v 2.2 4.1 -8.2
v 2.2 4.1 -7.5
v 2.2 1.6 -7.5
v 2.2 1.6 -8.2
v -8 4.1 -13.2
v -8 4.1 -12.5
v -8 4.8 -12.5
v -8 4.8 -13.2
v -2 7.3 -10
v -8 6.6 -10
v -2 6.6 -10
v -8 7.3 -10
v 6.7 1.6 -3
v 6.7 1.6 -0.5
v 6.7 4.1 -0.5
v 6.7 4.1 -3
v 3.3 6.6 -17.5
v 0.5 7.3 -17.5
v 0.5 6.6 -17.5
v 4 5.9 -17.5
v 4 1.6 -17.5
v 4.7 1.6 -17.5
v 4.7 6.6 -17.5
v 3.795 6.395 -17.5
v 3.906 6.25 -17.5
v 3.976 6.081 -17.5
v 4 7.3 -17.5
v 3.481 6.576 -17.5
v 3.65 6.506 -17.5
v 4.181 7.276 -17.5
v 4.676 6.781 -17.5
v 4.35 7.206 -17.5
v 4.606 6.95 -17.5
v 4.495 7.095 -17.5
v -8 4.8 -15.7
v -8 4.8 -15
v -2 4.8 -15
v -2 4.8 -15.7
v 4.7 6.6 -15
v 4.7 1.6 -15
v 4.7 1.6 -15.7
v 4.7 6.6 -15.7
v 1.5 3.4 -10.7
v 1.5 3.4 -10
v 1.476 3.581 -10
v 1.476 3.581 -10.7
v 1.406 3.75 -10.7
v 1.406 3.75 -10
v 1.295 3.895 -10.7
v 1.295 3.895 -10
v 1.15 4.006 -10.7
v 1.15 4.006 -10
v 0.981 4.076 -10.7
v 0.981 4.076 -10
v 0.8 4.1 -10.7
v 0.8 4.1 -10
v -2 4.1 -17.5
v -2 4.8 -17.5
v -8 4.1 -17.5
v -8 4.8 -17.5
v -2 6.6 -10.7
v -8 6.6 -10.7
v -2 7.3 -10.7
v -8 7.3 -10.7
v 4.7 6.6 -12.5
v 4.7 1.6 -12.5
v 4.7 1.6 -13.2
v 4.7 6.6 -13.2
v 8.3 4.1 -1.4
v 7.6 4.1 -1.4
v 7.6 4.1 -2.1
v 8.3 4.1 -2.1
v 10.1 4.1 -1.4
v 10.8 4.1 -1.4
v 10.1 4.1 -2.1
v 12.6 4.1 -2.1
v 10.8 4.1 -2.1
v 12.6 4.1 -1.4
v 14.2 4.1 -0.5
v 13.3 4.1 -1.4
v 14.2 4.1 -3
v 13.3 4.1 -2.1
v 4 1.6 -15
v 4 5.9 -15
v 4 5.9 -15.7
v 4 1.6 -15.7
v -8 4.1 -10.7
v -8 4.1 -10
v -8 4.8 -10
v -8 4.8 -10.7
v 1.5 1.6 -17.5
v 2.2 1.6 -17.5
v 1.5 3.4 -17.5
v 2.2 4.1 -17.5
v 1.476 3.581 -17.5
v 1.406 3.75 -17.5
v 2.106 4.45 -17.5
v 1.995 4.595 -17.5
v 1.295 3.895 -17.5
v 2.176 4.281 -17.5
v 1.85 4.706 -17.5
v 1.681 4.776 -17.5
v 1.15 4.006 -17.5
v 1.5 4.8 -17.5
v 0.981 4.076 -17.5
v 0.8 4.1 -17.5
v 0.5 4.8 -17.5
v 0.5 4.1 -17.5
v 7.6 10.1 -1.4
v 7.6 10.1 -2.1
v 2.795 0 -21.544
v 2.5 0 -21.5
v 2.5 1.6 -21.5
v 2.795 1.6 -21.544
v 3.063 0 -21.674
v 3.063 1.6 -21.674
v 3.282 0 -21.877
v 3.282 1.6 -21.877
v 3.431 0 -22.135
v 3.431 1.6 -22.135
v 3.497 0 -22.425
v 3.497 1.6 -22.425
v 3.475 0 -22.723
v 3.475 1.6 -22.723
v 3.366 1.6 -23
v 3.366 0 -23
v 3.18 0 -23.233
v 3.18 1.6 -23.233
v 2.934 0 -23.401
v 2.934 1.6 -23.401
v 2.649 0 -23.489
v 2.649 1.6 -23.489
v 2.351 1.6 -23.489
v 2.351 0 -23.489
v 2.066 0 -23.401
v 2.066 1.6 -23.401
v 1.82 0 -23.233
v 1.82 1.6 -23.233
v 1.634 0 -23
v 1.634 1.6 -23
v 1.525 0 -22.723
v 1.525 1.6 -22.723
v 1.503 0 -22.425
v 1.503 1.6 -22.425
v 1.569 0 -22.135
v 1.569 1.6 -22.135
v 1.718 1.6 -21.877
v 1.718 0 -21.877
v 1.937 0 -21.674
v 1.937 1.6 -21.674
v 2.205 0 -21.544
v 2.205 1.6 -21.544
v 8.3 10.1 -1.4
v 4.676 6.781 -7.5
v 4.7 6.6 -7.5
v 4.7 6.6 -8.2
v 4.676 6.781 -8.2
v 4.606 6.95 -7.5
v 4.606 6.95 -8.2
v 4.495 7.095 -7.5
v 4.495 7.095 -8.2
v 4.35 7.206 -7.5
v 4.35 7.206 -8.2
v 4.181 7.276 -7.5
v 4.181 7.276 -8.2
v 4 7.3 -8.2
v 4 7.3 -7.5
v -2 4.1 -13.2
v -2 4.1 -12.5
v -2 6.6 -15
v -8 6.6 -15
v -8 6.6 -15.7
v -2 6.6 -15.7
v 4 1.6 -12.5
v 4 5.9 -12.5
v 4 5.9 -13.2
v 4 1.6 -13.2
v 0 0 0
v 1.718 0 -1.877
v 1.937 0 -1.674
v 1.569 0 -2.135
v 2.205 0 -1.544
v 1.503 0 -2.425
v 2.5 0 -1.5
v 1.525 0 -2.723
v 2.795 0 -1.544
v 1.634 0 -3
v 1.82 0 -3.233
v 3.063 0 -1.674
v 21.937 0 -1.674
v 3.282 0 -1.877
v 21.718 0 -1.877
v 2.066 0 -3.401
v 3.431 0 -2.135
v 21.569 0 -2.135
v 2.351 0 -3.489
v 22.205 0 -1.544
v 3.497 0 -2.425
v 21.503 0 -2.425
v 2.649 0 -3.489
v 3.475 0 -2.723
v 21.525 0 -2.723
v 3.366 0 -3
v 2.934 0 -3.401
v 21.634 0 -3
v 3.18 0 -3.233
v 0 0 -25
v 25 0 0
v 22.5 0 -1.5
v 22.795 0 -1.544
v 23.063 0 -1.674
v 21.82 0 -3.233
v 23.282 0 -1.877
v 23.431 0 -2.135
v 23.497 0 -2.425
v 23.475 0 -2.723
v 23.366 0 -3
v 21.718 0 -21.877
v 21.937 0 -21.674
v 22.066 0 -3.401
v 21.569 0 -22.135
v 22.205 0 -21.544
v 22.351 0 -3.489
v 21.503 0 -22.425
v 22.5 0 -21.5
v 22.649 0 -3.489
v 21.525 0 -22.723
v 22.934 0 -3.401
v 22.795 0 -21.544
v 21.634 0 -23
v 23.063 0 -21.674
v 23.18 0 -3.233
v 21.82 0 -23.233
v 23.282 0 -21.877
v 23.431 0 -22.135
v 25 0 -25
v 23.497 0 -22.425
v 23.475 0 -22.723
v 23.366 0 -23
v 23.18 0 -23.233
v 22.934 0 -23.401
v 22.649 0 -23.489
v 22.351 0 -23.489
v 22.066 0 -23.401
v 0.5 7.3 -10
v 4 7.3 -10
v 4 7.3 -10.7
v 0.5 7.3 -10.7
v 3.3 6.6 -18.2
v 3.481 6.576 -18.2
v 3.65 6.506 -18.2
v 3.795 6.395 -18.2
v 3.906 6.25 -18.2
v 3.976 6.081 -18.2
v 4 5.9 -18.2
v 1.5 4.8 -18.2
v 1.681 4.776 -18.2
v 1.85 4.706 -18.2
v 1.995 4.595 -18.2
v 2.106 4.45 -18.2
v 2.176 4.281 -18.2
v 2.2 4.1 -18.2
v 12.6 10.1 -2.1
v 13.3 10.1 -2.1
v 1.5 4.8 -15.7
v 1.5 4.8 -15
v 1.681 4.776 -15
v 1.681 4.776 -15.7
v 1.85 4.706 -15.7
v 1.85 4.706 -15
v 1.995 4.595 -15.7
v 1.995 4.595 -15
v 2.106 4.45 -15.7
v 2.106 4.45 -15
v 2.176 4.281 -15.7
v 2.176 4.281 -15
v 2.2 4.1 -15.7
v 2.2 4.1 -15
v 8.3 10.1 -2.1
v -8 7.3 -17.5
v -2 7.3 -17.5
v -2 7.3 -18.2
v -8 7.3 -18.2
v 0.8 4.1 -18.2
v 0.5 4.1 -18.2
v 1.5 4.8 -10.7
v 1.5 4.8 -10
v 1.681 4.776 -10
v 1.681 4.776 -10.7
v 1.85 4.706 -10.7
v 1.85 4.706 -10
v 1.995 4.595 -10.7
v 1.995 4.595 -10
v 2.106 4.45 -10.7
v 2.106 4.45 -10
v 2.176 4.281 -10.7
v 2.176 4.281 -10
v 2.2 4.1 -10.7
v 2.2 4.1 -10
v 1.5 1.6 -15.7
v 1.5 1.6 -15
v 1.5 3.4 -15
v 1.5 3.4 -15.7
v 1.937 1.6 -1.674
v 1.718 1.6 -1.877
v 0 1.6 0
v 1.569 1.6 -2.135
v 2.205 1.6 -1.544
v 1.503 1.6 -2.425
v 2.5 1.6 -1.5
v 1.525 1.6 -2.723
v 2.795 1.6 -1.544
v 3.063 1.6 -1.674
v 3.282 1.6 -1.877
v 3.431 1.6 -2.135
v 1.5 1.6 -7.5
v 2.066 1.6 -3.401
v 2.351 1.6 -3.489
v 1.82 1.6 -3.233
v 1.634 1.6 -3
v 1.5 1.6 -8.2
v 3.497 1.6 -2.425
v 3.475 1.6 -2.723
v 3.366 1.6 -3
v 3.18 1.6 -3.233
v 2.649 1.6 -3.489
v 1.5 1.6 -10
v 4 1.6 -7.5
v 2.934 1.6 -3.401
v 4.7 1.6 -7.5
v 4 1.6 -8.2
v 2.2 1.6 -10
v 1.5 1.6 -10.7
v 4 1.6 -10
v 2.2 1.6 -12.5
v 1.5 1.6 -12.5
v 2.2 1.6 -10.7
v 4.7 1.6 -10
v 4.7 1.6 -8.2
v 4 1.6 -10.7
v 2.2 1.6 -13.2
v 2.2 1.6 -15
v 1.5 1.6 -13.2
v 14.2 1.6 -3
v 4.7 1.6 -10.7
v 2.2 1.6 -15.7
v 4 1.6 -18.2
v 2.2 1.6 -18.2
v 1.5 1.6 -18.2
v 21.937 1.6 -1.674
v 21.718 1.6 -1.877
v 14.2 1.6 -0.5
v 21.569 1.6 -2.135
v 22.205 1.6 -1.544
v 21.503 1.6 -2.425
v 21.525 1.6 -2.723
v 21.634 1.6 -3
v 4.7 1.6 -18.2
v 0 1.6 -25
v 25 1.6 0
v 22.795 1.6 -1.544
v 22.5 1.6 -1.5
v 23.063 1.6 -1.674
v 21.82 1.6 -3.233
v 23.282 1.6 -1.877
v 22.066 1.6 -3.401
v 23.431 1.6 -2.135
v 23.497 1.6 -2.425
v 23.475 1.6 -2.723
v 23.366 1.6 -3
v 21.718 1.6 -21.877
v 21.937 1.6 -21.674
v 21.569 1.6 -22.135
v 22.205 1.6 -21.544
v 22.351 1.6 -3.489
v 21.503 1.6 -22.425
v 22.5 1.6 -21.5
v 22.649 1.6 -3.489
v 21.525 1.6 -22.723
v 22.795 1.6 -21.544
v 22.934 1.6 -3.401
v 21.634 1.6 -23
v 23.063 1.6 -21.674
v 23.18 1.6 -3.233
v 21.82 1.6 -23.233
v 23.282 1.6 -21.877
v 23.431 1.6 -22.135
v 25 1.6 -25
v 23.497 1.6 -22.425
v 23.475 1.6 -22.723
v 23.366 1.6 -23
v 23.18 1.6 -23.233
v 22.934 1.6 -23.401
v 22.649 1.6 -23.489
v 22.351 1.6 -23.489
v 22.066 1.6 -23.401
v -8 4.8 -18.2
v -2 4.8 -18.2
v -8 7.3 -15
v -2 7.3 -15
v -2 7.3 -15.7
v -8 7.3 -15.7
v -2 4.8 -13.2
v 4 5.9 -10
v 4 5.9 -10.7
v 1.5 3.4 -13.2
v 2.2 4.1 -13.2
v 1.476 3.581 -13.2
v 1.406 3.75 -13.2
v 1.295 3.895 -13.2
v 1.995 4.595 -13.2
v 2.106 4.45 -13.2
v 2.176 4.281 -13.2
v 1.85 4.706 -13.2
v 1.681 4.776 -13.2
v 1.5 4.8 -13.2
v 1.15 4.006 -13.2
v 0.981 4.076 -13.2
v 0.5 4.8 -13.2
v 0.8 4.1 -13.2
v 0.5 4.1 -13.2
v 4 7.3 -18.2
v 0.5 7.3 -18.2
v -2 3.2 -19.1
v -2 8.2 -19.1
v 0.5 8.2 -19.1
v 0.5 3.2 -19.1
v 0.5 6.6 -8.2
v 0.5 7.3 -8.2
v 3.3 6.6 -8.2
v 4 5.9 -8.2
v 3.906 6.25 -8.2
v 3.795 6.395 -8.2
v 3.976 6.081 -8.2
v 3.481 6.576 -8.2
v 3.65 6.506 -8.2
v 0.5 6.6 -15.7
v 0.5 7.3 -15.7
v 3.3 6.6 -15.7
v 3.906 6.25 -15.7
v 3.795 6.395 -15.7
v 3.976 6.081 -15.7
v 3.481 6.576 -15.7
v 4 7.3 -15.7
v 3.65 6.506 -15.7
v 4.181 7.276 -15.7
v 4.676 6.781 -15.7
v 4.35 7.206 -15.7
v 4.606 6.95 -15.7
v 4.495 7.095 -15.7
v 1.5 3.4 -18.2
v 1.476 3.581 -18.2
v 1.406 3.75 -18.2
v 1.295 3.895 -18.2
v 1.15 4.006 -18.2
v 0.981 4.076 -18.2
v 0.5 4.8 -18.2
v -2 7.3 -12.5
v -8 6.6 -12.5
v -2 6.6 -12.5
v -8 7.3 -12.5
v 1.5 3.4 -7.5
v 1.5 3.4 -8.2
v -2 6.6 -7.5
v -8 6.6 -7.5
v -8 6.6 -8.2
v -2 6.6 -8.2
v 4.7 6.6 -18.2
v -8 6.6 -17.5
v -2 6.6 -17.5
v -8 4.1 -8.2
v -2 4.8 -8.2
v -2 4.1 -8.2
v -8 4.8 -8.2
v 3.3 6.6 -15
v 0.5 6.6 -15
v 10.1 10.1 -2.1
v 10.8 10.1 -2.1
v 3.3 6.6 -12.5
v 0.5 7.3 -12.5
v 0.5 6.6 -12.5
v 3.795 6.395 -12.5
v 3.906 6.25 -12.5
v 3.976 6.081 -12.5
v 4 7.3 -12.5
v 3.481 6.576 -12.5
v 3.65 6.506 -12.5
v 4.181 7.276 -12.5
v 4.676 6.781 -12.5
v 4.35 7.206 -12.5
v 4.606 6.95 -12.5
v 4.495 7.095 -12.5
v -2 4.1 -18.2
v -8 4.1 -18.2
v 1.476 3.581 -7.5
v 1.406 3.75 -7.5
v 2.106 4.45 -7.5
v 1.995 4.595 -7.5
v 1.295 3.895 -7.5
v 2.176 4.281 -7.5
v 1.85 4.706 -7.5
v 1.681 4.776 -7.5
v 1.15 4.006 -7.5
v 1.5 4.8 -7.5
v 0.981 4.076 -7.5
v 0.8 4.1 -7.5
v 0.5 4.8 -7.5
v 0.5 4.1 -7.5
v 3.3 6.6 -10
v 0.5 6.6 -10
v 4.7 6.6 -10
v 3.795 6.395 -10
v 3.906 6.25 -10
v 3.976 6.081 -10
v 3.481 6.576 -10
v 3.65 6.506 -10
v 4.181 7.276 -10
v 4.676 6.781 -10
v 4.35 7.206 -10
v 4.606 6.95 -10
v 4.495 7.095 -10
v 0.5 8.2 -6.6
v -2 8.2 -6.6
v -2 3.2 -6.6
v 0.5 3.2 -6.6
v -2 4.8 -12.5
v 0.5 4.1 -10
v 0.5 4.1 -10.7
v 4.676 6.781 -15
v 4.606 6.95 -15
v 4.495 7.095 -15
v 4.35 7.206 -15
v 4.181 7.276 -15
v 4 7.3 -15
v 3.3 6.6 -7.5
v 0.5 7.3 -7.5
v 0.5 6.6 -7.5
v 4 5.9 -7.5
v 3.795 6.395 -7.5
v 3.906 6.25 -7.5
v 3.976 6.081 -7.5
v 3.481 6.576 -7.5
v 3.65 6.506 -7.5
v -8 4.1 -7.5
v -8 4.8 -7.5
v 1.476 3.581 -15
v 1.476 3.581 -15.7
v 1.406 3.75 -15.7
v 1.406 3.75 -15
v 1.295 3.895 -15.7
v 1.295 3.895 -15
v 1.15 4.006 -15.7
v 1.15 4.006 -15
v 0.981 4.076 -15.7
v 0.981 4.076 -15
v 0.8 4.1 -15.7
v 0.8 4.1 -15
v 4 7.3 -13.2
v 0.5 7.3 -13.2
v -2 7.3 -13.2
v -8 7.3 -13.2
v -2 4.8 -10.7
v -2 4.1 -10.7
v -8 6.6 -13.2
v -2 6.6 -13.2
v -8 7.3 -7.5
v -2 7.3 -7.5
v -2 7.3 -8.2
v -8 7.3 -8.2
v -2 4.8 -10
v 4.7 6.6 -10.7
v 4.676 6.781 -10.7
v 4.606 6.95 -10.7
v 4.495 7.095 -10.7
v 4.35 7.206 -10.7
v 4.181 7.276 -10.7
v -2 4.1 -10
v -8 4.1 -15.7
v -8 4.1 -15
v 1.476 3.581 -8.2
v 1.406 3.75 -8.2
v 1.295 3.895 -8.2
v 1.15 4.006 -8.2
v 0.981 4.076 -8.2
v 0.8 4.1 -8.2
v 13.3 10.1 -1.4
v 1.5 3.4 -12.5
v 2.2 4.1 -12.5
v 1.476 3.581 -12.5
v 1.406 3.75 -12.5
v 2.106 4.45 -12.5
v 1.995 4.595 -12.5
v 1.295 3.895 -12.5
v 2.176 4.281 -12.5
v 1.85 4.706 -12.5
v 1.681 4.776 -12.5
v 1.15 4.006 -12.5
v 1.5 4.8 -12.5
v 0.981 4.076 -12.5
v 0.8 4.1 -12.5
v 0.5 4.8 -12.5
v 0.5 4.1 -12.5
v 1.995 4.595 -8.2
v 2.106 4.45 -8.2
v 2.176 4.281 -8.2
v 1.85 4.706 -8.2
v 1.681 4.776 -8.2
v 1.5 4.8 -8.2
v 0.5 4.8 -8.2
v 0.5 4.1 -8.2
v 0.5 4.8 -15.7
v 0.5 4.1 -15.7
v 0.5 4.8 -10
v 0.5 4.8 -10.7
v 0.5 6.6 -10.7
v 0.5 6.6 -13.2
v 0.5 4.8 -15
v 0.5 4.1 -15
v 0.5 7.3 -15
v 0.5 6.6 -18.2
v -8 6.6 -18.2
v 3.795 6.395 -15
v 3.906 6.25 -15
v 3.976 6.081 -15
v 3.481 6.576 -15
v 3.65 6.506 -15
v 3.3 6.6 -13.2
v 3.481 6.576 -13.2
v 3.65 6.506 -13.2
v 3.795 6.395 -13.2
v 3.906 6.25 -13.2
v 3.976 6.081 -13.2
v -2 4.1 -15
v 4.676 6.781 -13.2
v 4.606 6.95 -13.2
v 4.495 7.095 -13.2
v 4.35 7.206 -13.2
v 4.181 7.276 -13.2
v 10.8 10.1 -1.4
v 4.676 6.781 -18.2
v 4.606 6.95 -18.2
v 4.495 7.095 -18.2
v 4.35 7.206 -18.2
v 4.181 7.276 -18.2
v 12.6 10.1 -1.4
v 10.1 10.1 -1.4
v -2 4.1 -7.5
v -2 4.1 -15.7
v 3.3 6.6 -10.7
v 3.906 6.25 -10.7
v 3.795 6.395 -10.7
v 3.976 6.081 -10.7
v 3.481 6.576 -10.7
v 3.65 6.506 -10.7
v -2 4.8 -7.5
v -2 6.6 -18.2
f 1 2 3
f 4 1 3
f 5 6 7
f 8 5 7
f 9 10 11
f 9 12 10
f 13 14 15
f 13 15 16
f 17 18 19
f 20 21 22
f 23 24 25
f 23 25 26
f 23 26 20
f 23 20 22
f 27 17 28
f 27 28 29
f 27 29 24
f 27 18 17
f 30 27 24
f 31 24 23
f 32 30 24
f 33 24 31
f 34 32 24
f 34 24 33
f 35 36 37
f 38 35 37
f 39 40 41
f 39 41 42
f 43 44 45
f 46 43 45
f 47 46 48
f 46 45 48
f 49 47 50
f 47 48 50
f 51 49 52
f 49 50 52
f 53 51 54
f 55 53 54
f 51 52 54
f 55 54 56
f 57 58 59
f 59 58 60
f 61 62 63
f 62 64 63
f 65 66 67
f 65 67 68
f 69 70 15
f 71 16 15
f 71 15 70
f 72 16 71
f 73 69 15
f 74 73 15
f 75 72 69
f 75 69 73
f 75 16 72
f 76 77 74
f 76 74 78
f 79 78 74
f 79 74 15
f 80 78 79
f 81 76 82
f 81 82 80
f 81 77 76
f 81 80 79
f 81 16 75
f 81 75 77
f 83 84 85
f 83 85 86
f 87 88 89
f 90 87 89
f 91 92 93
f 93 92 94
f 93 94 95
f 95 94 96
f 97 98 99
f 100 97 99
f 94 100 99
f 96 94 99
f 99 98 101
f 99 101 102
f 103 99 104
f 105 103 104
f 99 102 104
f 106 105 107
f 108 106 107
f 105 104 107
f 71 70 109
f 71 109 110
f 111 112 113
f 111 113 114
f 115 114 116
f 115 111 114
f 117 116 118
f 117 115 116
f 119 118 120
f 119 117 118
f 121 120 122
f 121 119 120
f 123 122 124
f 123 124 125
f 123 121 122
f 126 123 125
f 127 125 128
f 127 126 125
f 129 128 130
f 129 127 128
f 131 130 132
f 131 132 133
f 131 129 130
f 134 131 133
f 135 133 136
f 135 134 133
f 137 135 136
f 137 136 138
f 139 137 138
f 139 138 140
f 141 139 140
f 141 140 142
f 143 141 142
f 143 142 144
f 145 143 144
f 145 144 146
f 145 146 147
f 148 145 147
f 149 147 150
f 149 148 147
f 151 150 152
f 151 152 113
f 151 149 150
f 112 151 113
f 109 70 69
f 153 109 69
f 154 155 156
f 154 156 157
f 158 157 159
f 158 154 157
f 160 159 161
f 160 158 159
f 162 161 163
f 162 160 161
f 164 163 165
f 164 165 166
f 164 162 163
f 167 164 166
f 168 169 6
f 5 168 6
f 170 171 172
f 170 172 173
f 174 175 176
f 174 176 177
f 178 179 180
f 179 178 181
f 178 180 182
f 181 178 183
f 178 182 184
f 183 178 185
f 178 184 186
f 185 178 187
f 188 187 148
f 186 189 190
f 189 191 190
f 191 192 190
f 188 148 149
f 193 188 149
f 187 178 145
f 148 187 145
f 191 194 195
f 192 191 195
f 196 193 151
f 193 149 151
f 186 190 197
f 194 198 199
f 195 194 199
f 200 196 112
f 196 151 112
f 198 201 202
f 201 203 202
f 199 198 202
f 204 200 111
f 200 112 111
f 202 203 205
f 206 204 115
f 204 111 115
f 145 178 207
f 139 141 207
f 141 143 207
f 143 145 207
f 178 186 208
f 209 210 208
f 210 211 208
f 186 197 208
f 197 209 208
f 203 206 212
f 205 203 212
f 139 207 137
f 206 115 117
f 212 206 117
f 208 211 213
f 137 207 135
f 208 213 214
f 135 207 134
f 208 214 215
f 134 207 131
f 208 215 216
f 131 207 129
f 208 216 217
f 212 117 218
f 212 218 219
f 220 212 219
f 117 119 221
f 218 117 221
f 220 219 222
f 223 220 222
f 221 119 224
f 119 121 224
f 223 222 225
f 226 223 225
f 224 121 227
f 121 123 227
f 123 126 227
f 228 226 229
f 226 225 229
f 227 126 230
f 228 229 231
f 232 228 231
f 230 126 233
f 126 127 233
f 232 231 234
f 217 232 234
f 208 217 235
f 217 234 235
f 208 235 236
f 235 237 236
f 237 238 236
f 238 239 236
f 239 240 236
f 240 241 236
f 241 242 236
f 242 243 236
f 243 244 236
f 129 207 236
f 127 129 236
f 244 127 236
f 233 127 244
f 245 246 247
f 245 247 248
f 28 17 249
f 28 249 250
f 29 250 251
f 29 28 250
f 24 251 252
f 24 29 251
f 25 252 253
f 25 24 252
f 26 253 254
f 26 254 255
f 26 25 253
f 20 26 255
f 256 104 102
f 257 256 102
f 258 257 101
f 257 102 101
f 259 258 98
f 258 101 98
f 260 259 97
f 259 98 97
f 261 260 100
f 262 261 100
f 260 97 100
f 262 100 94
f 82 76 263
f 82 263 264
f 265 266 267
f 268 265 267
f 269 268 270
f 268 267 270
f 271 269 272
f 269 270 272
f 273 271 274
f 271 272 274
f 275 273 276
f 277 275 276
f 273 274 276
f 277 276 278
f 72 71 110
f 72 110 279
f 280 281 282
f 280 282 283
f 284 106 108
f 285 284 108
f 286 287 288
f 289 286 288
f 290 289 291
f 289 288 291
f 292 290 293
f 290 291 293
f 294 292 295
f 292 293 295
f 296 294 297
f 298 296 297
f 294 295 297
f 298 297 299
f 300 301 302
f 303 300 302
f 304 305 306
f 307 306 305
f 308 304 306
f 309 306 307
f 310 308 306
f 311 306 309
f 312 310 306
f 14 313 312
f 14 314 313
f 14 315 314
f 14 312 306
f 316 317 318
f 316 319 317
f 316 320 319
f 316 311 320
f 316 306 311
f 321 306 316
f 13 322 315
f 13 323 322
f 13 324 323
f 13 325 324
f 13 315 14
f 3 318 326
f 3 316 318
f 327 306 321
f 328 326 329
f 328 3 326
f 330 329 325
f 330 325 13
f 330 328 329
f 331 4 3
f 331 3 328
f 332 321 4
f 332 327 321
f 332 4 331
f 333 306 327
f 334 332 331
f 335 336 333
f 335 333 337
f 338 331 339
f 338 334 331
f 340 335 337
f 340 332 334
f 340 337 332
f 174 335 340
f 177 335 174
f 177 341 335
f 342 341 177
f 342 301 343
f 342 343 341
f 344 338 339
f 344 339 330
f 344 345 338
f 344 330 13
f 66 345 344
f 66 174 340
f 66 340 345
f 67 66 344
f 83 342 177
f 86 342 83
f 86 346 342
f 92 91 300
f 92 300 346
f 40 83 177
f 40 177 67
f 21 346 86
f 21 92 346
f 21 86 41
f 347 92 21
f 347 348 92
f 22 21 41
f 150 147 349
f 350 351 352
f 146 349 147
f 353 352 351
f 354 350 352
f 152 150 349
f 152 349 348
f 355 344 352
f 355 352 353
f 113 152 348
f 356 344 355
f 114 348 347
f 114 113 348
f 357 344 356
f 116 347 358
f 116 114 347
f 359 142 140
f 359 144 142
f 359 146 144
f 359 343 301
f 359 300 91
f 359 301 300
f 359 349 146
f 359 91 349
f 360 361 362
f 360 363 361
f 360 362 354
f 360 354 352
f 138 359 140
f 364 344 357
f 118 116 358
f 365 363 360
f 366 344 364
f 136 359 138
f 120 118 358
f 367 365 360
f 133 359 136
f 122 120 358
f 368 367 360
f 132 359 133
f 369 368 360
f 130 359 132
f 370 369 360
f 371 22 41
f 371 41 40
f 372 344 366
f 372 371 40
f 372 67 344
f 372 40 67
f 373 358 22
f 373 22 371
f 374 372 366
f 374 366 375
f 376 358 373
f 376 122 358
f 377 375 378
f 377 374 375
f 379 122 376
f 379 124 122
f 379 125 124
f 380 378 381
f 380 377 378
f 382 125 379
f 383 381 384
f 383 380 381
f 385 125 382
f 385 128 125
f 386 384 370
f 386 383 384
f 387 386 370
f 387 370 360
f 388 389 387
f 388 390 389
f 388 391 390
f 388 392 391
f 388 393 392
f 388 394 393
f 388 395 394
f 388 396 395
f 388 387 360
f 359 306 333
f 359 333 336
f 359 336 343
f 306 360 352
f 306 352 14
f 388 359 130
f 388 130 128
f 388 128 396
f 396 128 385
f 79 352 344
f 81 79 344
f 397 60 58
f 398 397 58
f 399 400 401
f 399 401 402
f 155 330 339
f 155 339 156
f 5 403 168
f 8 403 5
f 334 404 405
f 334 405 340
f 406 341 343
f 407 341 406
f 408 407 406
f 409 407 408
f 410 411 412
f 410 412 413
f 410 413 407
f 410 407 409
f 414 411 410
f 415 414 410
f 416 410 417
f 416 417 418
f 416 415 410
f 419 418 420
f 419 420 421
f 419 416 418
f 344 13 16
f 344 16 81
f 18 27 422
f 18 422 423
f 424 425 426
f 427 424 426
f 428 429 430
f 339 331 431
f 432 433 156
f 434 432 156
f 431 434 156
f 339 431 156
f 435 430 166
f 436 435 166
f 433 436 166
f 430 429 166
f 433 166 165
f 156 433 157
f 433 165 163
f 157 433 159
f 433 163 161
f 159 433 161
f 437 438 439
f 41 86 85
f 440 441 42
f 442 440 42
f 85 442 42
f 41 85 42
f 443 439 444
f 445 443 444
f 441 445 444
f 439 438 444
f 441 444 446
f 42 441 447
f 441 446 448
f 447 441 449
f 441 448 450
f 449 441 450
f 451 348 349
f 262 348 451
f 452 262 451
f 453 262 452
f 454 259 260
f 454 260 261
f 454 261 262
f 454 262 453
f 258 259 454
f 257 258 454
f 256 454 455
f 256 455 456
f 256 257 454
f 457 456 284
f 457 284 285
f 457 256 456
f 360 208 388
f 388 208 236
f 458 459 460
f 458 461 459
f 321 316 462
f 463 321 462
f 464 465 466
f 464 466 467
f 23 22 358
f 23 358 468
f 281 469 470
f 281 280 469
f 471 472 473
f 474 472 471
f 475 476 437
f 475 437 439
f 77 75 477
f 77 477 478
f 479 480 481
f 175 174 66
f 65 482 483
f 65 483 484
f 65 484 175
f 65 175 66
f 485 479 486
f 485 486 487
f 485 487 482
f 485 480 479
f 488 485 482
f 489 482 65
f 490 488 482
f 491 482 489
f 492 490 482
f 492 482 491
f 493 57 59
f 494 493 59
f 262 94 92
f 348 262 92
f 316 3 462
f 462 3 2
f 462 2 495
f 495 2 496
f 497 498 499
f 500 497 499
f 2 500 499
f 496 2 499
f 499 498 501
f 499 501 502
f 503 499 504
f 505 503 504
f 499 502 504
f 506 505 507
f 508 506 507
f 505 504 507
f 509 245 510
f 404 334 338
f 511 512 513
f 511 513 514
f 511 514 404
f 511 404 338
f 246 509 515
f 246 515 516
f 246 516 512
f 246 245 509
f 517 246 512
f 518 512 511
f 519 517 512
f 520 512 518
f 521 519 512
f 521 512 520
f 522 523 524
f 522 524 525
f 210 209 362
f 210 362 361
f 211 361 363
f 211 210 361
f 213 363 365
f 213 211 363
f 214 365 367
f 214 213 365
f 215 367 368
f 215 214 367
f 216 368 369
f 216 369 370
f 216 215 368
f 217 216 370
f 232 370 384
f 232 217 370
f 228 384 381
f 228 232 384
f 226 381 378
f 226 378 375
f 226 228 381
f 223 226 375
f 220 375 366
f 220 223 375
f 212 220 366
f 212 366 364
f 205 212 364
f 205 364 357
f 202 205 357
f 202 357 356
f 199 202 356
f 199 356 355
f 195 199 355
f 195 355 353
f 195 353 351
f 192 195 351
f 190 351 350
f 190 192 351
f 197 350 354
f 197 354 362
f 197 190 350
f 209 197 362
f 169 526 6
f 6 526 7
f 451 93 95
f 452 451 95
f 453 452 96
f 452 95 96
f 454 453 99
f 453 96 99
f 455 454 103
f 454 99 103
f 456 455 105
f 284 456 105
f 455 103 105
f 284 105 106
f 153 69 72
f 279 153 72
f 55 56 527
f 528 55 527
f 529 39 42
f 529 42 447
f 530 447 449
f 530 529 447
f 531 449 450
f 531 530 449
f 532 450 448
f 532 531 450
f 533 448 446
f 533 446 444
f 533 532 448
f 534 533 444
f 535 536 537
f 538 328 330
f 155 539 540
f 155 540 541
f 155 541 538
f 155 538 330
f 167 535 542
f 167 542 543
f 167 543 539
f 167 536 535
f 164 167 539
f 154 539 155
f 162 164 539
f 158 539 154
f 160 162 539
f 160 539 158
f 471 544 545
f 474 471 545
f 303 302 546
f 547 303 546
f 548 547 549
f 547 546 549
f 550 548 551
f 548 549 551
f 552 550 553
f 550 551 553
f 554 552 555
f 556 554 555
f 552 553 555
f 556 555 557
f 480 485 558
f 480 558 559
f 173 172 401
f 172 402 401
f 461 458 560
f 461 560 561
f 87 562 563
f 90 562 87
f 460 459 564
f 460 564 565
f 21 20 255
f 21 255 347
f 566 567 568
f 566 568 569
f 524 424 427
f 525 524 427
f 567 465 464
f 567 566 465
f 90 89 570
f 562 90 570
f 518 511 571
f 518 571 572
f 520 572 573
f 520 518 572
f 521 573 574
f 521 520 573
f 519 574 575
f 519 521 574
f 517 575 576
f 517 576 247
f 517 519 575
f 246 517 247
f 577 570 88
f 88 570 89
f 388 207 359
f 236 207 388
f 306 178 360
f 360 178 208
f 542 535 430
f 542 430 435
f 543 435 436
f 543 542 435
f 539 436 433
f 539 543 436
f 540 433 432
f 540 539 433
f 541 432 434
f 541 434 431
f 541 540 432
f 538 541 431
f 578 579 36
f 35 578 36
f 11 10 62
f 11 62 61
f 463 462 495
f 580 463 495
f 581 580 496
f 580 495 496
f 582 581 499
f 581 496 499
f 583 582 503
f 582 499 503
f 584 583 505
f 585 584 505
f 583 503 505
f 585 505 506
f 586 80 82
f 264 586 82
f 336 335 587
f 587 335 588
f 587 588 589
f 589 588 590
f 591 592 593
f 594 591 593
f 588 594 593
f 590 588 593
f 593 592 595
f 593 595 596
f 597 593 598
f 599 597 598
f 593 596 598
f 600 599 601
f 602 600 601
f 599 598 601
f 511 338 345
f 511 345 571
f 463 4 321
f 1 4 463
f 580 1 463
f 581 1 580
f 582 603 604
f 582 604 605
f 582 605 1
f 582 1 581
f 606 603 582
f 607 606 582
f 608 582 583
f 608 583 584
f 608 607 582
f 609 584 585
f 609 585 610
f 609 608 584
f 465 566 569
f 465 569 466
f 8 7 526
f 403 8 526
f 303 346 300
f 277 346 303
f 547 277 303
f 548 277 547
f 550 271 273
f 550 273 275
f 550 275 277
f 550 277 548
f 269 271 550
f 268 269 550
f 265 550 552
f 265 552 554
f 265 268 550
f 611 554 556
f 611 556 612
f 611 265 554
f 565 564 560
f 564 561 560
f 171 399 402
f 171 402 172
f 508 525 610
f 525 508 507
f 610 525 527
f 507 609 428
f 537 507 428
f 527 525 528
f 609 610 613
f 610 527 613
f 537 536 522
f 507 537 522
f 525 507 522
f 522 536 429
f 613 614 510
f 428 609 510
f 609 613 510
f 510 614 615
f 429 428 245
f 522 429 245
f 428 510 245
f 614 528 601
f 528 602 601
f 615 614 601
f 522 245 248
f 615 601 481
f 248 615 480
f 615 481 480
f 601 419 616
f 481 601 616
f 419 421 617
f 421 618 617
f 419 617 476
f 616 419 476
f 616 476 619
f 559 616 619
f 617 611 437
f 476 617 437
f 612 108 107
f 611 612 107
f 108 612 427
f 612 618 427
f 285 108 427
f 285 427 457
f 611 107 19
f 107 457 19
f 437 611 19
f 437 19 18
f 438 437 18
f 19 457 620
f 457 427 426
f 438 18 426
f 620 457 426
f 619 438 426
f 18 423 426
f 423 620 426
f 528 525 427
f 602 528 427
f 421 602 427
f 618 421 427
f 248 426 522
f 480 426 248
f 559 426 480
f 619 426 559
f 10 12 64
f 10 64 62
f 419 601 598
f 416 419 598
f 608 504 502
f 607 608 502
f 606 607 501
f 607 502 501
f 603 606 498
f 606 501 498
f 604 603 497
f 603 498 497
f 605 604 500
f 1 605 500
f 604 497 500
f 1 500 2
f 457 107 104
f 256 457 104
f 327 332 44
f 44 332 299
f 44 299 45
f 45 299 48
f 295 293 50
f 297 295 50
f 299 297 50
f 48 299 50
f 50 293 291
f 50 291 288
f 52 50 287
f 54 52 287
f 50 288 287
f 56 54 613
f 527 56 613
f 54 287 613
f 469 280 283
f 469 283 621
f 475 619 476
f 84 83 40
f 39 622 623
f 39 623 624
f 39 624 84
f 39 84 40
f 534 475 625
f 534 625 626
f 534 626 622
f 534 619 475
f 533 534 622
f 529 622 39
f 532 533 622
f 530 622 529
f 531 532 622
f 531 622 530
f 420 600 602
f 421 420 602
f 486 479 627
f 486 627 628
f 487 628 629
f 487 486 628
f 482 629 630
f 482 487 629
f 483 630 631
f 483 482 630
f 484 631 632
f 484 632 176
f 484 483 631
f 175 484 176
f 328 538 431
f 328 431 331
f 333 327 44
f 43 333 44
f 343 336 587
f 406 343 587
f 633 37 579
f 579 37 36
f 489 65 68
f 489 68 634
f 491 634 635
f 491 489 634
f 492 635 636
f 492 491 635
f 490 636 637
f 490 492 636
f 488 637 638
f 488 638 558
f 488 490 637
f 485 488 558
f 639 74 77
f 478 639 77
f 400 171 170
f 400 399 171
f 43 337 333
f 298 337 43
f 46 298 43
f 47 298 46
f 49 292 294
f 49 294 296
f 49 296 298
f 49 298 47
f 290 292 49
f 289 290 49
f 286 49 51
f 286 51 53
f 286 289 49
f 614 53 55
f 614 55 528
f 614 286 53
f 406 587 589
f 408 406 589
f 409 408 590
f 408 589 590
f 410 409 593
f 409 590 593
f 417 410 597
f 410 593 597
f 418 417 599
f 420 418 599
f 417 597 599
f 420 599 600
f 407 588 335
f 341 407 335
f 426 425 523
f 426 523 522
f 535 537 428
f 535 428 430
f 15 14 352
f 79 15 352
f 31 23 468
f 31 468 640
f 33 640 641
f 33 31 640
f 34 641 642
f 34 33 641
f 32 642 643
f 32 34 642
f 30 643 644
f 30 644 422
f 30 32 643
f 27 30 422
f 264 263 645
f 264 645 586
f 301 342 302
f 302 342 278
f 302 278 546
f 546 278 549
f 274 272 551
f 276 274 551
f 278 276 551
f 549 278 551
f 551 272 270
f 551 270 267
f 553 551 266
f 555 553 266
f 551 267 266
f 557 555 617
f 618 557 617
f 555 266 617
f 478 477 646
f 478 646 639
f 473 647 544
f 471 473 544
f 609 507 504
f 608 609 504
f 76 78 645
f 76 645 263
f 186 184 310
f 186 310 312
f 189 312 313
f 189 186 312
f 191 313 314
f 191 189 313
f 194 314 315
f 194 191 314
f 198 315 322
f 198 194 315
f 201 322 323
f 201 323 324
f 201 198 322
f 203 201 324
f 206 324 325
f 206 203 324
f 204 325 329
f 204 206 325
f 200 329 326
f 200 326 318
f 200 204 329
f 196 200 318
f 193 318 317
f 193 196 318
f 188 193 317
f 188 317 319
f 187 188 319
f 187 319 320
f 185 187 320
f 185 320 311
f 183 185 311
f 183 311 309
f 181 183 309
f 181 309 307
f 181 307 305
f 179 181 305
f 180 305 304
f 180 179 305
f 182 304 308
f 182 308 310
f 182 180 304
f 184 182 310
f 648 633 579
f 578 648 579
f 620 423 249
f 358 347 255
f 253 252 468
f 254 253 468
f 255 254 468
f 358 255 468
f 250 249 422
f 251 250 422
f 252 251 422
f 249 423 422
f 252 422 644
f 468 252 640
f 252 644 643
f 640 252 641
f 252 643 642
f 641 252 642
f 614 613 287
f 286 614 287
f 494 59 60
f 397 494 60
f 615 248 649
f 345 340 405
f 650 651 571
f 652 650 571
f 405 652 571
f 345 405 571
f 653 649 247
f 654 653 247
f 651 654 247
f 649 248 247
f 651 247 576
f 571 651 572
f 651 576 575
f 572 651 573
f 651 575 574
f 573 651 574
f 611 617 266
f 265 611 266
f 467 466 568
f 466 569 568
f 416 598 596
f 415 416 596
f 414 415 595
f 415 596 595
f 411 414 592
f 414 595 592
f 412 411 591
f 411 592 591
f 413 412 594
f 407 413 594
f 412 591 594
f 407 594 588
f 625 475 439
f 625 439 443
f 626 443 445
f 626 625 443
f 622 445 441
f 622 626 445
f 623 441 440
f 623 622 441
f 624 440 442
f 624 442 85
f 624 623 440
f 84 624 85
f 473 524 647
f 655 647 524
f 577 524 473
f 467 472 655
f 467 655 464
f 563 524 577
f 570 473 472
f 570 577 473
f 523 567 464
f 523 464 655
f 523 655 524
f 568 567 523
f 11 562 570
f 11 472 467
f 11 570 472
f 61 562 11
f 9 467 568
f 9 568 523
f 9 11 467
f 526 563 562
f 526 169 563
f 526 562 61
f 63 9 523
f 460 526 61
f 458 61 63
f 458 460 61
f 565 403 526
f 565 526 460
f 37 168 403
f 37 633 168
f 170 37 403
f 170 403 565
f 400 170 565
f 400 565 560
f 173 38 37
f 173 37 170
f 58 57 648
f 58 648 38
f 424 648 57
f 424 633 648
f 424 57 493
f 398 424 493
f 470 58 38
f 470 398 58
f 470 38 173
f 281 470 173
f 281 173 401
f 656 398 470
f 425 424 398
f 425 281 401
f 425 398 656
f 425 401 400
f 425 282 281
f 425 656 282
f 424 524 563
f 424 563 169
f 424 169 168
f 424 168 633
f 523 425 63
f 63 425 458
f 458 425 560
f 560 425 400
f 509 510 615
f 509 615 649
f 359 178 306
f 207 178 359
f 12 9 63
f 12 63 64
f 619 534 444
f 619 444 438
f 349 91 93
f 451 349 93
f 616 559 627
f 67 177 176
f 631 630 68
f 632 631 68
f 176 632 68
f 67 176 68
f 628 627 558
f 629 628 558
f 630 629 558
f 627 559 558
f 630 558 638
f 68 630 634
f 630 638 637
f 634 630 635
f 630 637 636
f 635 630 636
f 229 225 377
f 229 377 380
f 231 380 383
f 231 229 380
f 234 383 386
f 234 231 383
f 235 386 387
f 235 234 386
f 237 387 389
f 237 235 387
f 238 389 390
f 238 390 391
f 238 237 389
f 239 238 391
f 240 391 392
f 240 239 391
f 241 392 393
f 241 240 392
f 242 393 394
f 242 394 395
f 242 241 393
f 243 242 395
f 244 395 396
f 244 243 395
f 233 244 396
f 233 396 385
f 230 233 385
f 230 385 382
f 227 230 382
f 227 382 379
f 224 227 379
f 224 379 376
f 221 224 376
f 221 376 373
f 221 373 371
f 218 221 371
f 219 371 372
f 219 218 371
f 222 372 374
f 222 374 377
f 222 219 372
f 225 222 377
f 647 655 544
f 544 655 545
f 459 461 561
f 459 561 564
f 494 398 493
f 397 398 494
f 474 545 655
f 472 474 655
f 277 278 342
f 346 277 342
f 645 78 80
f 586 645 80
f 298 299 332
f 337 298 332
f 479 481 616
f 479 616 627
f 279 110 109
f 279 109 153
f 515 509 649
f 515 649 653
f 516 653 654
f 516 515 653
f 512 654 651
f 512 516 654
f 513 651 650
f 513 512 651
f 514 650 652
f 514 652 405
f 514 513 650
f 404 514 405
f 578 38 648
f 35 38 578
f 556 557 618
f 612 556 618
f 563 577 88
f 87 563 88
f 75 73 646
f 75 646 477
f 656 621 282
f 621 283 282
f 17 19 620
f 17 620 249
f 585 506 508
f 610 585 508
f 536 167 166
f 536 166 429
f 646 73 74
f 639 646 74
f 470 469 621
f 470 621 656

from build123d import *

# Parameters (mm, degrees)
SKETCH1_W                = 25
SKETCH1_H                = 25
SKETCH1_R                = 1
BOSS_EXTRUDE1_DEPTH      = 1.6
BOSS_EXTRUDE2_START      = -7.5
BOSS_EXTRUDE2_DEPTH      = 0.7
LPATTERN1_COUNT          = 5
LPATTERN1_PITCH          = 2.5
BOSS_EXTRUDE3_DEPTH      = 0.9
BOSS_EXTRUDE3_DEPTH_BACK = 11.6
SKETCH4_W                = 2.5
SKETCH4_H                = 5
SKETCH5_W                = 2.5
SKETCH5_H                = 2.5
BOSS_EXTRUDE4_DEPTH      = 2.5
SKETCH6_W                = 0.7
SKETCH6_H                = 0.7
BOSS_EXTRUDE5_DEPTH      = 6
LPATTERN2_COUNT          = 3
LPATTERN2_PITCH          = 2.5


with BuildPart() as part:
    # Sketch1 → Boss-Extrude1 (new body)
    with BuildSketch(Plane(origin=(0, 0, 0), x_dir=(1, 0, 0), z_dir=(0, 1, 0))):
        with Locations((12.5, 12.5)):
            Rectangle(SKETCH1_W, SKETCH1_H)
        with Locations(Location((2.5, 22.5, 0), (0, 0, 270))):
            Circle(SKETCH1_R, mode=Mode.SUBTRACT)
        with Locations(Location((22.5, 22.5, 0), (0, 0, 270))):
            Circle(SKETCH1_R, mode=Mode.SUBTRACT)
        with Locations(Location((22.5, 2.5, 0), (0, 0, 270))):
            Circle(SKETCH1_R, mode=Mode.SUBTRACT)
        with Locations(Location((2.5, 2.5, 0), (0, 0, 270))):
            Circle(SKETCH1_R, mode=Mode.SUBTRACT)
    extrude(amount=BOSS_EXTRUDE1_DEPTH)

    # Sketch3 → Boss-Extrude2 (add)
    with BuildSketch(Plane.XY.offset(BOSS_EXTRUDE2_START)):
        with BuildLine():
            Line((1.5, 1.6), (1.5, 3.4))
            ThreePointArc((1.5, 3.4), (1.294974747, 3.894974747), (0.8, 4.1))
            Line((0.8, 4.1), (-8, 4.1))
            Line((-8, 4.1), (-8, 4.8))
            Line((-8, 4.8), (1.5, 4.8))
            ThreePointArc((1.5, 4.8), (1.994974747, 4.594974747), (2.2, 4.1))
            Line((2.2, 4.1), (2.2, 1.6))
            Line((2.2, 1.6), (1.5, 1.6))
        make_face()
        with BuildLine():
            Line((4, 1.6), (4.7, 1.6))
            Line((4.7, 1.6), (4.7, 6.6))
            ThreePointArc((4.7, 6.6), (4.494974747, 7.094974747), (4, 7.3))
            Line((4, 7.3), (-8, 7.3))
            Line((-8, 7.3), (-8, 6.6))
            Line((-8, 6.6), (3.3, 6.6))
            ThreePointArc((3.3, 6.6), (3.794974747, 6.394974747), (4, 5.9))
            Line((4, 5.9), (4, 1.6))
        make_face()
    boss_extrude2 = extrude(amount=-BOSS_EXTRUDE2_DEPTH)

    # LPattern1: Boss-Extrude2 ×5
    with Locations(*[(0, 0, -i * LPATTERN1_PITCH) for i in range(1, LPATTERN1_COUNT)]):
        add(boss_extrude2)

    # Sketch4 → Boss-Extrude3 (add, two sides: drawn at the far end of the back side and taken through both)
    with BuildSketch(Plane.XY.offset(-7.5).offset(-BOSS_EXTRUDE3_DEPTH_BACK)):
        with Locations((-0.75, 5.7)):
            Rectangle(SKETCH4_W, SKETCH4_H)
    extrude(amount=BOSS_EXTRUDE3_DEPTH + BOSS_EXTRUDE3_DEPTH_BACK)

    # Sketch5 → Boss-Extrude4 (add)
    with BuildSketch(Plane(origin=(0, 1.6, 0), x_dir=(1, 0, 0), z_dir=(0, 1, 0))):
        with Locations((7.95, 1.75)):
            Rectangle(SKETCH5_W, SKETCH5_H)
    boss_extrude4 = extrude(amount=BOSS_EXTRUDE4_DEPTH)

    # Sketch6 → Boss-Extrude5 (add)
    with BuildSketch(Plane(origin=(0, 4.1, 0), x_dir=(1, 0, 0), z_dir=(0, 1, 0))):
        with Locations((7.95, 1.75)):
            Rectangle(SKETCH6_W, SKETCH6_H)
    boss_extrude5 = extrude(amount=BOSS_EXTRUDE5_DEPTH)

    # LPattern2: Boss-Extrude4, Boss-Extrude5 ×3
    with Locations(*[(i * LPATTERN2_PITCH, 0, 0) for i in range(1, LPATTERN2_COUNT)]):
        add(boss_extrude4)
        add(boss_extrude5)


solid = part.part
